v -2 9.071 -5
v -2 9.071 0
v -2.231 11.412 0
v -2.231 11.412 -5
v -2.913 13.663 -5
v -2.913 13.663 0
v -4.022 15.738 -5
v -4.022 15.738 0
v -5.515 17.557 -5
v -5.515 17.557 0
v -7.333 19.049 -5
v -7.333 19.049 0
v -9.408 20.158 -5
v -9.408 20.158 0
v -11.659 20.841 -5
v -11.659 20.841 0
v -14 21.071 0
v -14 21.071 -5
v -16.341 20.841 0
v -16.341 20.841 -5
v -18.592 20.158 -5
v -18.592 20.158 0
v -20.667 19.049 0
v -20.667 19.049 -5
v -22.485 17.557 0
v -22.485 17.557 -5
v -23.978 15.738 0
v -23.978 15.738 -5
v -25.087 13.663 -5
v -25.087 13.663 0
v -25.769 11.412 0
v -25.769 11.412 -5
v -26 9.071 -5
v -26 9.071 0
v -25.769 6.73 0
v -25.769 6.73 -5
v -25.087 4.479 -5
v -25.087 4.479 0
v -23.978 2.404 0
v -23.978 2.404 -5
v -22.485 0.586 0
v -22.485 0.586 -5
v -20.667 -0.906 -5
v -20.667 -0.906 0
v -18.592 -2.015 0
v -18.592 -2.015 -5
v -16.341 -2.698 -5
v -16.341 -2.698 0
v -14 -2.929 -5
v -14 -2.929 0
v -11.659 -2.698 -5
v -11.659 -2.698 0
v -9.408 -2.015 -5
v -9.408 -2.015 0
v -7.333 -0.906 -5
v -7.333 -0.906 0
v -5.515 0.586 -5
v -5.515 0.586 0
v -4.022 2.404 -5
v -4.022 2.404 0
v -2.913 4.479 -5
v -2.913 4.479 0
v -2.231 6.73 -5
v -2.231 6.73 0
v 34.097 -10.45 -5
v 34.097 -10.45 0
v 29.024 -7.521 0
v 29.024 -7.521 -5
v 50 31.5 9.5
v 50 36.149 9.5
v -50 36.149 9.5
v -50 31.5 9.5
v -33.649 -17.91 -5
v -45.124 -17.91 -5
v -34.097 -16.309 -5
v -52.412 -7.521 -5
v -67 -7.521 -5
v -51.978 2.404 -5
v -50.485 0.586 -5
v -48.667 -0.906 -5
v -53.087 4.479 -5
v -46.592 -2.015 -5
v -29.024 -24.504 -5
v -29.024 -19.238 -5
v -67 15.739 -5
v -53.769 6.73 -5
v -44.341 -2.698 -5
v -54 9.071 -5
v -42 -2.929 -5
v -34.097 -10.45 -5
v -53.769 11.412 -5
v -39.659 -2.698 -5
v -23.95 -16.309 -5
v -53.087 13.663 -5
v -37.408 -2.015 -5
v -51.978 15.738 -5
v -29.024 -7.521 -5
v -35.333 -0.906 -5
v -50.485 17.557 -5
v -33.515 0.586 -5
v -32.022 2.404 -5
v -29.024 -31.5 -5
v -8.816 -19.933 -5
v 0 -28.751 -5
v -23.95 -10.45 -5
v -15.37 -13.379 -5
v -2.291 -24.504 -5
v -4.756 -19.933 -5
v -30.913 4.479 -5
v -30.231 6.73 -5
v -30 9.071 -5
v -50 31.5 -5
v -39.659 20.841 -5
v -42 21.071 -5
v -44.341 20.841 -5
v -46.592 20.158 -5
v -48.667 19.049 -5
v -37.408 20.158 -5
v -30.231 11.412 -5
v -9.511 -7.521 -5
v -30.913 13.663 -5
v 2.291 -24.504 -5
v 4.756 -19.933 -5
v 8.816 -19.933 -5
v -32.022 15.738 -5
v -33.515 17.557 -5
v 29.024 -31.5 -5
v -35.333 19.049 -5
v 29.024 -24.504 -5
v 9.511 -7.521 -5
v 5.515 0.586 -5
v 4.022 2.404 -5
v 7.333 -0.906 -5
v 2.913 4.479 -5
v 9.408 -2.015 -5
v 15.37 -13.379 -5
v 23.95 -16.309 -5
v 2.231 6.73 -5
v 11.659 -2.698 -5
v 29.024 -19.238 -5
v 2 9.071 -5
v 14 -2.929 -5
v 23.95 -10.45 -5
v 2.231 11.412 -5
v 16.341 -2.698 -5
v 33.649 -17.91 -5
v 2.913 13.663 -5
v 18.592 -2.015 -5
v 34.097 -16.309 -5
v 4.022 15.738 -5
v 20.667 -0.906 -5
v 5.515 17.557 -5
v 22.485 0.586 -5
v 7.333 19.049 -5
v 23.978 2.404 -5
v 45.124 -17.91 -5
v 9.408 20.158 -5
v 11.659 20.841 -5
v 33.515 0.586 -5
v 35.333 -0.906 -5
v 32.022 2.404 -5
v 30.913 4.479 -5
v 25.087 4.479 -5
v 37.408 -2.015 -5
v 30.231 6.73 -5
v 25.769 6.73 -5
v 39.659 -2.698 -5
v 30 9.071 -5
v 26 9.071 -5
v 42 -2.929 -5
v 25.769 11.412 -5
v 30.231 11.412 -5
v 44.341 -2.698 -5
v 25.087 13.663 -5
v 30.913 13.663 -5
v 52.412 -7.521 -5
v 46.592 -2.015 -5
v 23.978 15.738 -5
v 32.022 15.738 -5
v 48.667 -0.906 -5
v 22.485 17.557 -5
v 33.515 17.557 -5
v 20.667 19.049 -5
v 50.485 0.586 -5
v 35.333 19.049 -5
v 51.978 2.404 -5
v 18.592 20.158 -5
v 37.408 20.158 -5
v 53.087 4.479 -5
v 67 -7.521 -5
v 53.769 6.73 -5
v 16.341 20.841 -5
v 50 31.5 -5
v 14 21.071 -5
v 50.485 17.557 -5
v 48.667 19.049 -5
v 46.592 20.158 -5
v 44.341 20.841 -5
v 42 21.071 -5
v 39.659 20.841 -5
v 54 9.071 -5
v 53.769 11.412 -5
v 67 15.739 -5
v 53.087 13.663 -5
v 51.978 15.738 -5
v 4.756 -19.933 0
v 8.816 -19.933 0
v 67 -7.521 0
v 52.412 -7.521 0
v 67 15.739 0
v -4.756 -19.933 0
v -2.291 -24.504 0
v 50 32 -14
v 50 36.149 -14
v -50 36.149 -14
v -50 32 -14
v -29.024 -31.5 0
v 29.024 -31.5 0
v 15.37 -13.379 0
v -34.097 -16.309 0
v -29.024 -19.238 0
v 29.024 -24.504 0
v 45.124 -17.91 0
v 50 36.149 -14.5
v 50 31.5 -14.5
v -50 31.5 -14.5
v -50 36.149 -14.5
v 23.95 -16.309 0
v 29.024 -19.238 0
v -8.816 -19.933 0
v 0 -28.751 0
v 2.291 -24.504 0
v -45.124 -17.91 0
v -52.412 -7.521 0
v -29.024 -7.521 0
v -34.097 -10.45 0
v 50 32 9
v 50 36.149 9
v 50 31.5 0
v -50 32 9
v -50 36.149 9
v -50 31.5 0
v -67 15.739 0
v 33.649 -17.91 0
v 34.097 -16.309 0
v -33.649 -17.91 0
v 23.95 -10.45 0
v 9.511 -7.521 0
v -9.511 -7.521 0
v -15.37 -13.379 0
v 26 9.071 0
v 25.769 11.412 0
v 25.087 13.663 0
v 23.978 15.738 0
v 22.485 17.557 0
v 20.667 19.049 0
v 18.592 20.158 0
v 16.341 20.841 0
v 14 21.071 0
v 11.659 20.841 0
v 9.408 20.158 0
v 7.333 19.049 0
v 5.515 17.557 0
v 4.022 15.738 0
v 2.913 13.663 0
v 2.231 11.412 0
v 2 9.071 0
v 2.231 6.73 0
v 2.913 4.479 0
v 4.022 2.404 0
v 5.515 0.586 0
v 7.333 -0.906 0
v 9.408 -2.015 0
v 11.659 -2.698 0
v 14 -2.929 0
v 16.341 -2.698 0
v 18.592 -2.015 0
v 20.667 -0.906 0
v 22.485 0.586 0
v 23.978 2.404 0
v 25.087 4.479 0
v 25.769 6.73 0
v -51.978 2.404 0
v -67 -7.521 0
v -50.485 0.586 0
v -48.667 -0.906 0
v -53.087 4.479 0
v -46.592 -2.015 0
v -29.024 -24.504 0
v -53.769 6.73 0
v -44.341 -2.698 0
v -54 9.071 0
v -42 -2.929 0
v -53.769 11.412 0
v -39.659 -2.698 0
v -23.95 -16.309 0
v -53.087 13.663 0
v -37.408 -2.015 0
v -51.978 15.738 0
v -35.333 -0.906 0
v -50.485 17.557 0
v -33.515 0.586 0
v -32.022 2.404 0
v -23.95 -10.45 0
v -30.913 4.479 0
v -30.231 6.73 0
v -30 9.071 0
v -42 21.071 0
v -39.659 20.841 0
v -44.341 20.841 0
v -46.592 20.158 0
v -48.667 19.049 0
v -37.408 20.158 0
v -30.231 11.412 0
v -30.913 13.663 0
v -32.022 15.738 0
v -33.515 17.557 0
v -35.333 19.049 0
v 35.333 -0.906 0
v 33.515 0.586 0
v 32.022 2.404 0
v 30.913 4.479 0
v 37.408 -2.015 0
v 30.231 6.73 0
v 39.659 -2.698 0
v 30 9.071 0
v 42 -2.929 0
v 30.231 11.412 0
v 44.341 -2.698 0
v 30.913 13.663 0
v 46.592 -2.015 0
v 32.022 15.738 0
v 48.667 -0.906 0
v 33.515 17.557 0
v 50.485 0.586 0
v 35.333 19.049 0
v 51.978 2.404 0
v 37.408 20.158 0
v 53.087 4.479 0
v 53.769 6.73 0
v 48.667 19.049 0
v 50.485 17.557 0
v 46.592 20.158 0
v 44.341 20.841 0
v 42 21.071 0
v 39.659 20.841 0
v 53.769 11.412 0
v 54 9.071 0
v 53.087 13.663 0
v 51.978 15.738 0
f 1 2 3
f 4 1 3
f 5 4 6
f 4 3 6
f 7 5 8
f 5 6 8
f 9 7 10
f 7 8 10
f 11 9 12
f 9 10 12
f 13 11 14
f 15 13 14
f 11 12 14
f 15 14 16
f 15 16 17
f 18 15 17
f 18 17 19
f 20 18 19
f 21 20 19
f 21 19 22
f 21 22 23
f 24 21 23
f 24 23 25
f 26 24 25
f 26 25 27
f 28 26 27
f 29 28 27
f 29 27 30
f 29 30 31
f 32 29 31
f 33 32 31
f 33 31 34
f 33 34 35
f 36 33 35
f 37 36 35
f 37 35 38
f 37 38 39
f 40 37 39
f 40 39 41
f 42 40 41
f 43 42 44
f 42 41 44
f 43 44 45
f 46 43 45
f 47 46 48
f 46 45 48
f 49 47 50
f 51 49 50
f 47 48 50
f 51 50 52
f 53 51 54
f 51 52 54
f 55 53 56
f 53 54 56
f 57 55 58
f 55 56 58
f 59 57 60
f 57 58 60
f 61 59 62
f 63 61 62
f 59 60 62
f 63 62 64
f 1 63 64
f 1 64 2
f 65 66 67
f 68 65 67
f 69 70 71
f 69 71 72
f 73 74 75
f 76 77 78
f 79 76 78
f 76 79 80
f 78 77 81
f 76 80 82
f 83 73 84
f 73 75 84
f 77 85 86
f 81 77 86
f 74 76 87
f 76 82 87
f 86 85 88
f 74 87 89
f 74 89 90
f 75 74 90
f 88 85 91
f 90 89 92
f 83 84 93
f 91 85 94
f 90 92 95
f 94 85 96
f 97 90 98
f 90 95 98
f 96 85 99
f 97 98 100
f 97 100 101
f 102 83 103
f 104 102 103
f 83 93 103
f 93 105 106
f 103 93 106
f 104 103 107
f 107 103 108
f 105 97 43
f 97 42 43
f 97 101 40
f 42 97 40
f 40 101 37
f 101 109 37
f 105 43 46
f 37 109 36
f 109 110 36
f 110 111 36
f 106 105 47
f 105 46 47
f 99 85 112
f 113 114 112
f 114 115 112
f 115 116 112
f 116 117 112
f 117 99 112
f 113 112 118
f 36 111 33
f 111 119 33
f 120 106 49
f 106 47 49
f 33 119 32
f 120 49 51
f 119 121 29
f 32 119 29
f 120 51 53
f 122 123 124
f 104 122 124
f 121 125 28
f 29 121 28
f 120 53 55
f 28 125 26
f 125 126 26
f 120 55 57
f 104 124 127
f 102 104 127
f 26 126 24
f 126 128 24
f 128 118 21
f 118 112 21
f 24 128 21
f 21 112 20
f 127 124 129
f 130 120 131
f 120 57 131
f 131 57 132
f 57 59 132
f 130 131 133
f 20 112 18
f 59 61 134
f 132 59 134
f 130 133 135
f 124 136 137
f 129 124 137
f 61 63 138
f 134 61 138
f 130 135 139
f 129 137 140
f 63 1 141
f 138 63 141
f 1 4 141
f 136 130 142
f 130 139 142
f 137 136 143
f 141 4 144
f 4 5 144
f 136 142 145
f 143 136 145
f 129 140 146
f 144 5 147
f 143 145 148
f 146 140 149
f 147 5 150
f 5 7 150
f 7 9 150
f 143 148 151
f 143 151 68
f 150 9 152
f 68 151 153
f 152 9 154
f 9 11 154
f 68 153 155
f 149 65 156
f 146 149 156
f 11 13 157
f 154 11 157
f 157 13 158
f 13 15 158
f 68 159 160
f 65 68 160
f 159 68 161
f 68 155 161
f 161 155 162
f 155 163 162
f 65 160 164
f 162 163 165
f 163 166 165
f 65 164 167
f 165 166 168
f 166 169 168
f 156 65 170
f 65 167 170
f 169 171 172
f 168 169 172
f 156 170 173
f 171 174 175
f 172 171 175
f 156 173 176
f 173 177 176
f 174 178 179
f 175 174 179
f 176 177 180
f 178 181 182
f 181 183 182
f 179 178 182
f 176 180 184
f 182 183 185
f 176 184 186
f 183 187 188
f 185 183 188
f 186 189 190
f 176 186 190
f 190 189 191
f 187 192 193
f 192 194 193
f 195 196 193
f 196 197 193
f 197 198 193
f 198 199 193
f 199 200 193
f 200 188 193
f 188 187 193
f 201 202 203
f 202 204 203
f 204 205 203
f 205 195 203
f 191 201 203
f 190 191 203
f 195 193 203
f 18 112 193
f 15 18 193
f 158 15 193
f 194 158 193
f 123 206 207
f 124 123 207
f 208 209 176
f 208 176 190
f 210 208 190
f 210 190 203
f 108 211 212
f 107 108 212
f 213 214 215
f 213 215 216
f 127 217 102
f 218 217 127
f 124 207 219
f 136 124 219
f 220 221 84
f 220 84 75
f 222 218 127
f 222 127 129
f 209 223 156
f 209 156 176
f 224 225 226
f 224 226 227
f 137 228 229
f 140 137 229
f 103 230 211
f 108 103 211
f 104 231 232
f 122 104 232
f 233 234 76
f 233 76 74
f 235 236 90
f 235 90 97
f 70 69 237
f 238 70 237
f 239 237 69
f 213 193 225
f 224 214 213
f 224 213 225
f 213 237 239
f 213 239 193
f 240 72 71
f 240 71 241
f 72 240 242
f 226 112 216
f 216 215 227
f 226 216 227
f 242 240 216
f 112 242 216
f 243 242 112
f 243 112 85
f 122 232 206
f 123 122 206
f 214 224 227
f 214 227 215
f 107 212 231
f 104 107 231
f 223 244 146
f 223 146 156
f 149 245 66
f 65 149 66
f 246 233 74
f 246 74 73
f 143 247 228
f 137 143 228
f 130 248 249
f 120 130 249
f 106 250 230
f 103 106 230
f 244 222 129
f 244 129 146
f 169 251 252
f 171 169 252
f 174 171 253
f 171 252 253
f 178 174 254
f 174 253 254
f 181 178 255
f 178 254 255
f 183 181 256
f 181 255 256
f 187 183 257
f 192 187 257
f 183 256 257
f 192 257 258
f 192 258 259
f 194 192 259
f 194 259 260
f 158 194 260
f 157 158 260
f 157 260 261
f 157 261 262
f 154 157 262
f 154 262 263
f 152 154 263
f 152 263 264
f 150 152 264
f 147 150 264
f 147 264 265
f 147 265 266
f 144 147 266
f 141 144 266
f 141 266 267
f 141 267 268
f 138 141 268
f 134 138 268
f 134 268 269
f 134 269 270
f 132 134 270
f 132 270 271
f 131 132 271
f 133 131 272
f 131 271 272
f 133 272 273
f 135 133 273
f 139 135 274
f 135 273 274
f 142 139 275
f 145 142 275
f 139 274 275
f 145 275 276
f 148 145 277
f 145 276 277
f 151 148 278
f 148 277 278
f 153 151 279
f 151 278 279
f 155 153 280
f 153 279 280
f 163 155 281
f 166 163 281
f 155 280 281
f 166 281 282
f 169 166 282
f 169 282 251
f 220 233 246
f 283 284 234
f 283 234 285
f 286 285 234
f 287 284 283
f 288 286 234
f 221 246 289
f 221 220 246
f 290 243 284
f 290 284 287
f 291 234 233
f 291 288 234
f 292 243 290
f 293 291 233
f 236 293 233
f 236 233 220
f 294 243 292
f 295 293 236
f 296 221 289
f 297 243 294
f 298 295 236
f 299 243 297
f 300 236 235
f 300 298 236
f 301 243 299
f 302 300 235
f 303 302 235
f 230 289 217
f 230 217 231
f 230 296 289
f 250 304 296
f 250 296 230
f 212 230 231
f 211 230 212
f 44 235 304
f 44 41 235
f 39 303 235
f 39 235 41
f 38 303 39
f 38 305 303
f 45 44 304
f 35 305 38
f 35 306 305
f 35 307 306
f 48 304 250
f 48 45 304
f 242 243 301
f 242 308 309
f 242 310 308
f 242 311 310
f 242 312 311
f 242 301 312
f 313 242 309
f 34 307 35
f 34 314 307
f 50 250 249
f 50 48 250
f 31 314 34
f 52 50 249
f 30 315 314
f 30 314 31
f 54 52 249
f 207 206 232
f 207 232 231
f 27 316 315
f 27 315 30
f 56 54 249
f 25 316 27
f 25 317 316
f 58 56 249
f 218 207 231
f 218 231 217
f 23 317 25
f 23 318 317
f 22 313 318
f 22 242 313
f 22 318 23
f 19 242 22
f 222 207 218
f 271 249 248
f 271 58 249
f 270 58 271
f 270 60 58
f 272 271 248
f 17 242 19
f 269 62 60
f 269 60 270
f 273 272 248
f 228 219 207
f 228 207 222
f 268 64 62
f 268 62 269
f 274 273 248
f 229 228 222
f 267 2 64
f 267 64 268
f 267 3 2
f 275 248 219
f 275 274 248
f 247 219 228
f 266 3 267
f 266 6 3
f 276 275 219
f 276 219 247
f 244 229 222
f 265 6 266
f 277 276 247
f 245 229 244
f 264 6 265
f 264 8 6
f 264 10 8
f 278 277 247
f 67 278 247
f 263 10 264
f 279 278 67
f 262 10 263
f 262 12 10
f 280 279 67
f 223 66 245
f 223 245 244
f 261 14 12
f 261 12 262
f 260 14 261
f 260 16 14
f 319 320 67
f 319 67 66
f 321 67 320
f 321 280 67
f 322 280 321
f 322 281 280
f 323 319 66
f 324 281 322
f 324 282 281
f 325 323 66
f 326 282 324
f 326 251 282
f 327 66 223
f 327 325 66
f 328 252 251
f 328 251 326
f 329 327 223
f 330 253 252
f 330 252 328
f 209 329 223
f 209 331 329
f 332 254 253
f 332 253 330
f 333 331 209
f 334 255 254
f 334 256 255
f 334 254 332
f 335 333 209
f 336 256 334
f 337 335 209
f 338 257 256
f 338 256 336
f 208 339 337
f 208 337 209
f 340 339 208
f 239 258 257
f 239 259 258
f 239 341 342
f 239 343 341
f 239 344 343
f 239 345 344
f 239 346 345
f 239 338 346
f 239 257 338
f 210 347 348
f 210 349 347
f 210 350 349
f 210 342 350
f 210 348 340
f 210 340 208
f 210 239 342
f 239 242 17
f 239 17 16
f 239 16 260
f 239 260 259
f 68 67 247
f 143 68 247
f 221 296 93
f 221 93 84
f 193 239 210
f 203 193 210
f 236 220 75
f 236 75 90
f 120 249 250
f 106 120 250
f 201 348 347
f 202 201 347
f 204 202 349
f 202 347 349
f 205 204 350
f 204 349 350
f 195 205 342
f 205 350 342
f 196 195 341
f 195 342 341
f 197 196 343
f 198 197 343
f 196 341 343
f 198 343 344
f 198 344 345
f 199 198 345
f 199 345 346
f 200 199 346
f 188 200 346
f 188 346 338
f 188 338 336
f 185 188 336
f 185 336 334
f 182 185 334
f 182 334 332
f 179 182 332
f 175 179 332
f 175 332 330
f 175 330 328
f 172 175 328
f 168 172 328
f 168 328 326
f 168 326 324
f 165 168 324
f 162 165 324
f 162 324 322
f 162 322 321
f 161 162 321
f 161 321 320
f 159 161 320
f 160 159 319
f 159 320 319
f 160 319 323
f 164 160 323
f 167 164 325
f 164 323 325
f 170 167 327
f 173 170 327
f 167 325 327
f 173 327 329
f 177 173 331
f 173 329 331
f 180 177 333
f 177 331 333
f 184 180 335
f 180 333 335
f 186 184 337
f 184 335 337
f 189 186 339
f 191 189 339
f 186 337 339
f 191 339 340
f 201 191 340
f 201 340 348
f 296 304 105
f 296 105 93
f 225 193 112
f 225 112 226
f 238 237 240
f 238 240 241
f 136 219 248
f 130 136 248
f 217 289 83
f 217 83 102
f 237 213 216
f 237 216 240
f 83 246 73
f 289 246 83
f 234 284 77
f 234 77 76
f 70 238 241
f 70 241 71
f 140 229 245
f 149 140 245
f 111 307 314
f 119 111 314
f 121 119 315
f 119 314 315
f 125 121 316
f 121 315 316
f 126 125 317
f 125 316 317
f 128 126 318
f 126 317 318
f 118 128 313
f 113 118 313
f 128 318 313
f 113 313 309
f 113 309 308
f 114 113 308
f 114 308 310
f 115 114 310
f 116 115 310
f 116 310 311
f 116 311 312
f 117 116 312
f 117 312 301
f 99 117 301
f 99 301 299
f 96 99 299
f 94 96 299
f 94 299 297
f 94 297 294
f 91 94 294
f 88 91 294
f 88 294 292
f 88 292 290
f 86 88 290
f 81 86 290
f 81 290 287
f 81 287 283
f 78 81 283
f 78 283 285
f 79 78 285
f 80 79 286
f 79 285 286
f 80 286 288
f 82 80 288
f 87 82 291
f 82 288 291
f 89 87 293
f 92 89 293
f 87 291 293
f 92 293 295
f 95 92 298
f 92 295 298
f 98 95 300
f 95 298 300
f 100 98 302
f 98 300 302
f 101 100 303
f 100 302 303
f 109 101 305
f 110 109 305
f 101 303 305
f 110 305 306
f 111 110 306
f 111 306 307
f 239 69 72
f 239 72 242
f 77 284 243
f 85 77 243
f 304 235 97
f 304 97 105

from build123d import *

# Parameters (mm, degrees)
SKETCH1_W           = 134
SKETCH1_H           = 63
BOSS_EXTRUDE1_DEPTH = 5
SKETCH3_R           = 12
CUT_EXTRUDE1_DEPTH  = 10
CUT_EXTRUDE2_DEPTH  = 10
BOSS_EXTRUDE2_DEPTH = 100


with BuildPart() as part:
    # Sketch1 → Boss-Extrude1 (new body)
    with BuildSketch(Plane.XY):
        Rectangle(SKETCH1_W, SKETCH1_H)
    extrude(amount=-BOSS_EXTRUDE1_DEPTH)

    # Sketch3 → Cut-Extrude1 (cut)
    with BuildSketch(Plane.XY):
        with Locations((-42, 9.071273883)):
            Circle(SKETCH3_R)
        with Locations((-14, 9.071273883)):
            Circle(SKETCH3_R)
        with Locations((14, 9.071273883)):
            Circle(SKETCH3_R)
        with Locations((42, 9.071273883)):
            Circle(SKETCH3_R)
    extrude(amount=-CUT_EXTRUDE1_DEPTH, mode=Mode.SUBTRACT)

    # Sketch4 → Cut-Extrude2 (cut)
    with BuildSketch(Plane.XY):
        Polygon((-67, -7.520628775), (-52.411804658, -7.520628775), (-45.12377265, -17.909951), (-33.648998849, -17.909951), (-29.023524966, -24.503711642), (-29.023524966, -31.5), (-67, -31.5), align=None)
        Polygon((67, -7.520628775), (67, -31.5), (29.023524966, -31.5), (29.023524966, -24.503711642), (33.648998849, -17.909951), (45.12377265, -17.909951), (52.411804658, -7.520628775), align=None)
        Polygon((-50, 31.5), (-67, 15.739047849), (-67, 31.5), align=None)
        Polygon((67, 15.739047849), (67, 31.5), (50, 31.5), align=None)
        Polygon((9.511401459, -7.520628775), (-9.511401459, -7.520628775), (-15.370004361, -13.379231677), (-8.815992906, -19.933243133), (-4.75570073, -19.933243133), (-2.290700849, -24.503711642), (0, -28.751004381), (2.290700849, -24.503711642), (4.75570073, -19.933243133), (8.815992906, -19.933243133), (15.370004361, -13.379231677), align=None)
        Polygon((-34.097223909, -10.449930226), (-29.023524966, -7.520628775), (-23.949826022, -10.449930226), (-23.949826022, -16.308533128), (-29.023524966, -19.237834579), (-34.097223909, -16.308533128), align=None)
        Polygon((29.023524966, -7.520628775), (23.949826022, -10.449930226), (23.949826022, -16.308533128), (29.023524966, -19.237834579), (34.097223909, -16.308533128), (34.097223909, -10.449930226), align=None)
    extrude(amount=-CUT_EXTRUDE2_DEPTH, mode=Mode.SUBTRACT)

    # Sketch5 → Boss-Extrude2 (add)
    with BuildSketch(Plane(origin=(50, 0, 0), x_dir=(0, 0, -1), z_dir=(1, 0, 0))):
        Polygon((-9.5, 31.5), (14.5, 31.5), (14.5, 36.149124197), (14, 36.149124197), (14, 32), (-9, 32), (-9, 36.149124197), (-9.5, 36.149124197), align=None)
    extrude(amount=-BOSS_EXTRUDE2_DEPTH)


solid = part.part
